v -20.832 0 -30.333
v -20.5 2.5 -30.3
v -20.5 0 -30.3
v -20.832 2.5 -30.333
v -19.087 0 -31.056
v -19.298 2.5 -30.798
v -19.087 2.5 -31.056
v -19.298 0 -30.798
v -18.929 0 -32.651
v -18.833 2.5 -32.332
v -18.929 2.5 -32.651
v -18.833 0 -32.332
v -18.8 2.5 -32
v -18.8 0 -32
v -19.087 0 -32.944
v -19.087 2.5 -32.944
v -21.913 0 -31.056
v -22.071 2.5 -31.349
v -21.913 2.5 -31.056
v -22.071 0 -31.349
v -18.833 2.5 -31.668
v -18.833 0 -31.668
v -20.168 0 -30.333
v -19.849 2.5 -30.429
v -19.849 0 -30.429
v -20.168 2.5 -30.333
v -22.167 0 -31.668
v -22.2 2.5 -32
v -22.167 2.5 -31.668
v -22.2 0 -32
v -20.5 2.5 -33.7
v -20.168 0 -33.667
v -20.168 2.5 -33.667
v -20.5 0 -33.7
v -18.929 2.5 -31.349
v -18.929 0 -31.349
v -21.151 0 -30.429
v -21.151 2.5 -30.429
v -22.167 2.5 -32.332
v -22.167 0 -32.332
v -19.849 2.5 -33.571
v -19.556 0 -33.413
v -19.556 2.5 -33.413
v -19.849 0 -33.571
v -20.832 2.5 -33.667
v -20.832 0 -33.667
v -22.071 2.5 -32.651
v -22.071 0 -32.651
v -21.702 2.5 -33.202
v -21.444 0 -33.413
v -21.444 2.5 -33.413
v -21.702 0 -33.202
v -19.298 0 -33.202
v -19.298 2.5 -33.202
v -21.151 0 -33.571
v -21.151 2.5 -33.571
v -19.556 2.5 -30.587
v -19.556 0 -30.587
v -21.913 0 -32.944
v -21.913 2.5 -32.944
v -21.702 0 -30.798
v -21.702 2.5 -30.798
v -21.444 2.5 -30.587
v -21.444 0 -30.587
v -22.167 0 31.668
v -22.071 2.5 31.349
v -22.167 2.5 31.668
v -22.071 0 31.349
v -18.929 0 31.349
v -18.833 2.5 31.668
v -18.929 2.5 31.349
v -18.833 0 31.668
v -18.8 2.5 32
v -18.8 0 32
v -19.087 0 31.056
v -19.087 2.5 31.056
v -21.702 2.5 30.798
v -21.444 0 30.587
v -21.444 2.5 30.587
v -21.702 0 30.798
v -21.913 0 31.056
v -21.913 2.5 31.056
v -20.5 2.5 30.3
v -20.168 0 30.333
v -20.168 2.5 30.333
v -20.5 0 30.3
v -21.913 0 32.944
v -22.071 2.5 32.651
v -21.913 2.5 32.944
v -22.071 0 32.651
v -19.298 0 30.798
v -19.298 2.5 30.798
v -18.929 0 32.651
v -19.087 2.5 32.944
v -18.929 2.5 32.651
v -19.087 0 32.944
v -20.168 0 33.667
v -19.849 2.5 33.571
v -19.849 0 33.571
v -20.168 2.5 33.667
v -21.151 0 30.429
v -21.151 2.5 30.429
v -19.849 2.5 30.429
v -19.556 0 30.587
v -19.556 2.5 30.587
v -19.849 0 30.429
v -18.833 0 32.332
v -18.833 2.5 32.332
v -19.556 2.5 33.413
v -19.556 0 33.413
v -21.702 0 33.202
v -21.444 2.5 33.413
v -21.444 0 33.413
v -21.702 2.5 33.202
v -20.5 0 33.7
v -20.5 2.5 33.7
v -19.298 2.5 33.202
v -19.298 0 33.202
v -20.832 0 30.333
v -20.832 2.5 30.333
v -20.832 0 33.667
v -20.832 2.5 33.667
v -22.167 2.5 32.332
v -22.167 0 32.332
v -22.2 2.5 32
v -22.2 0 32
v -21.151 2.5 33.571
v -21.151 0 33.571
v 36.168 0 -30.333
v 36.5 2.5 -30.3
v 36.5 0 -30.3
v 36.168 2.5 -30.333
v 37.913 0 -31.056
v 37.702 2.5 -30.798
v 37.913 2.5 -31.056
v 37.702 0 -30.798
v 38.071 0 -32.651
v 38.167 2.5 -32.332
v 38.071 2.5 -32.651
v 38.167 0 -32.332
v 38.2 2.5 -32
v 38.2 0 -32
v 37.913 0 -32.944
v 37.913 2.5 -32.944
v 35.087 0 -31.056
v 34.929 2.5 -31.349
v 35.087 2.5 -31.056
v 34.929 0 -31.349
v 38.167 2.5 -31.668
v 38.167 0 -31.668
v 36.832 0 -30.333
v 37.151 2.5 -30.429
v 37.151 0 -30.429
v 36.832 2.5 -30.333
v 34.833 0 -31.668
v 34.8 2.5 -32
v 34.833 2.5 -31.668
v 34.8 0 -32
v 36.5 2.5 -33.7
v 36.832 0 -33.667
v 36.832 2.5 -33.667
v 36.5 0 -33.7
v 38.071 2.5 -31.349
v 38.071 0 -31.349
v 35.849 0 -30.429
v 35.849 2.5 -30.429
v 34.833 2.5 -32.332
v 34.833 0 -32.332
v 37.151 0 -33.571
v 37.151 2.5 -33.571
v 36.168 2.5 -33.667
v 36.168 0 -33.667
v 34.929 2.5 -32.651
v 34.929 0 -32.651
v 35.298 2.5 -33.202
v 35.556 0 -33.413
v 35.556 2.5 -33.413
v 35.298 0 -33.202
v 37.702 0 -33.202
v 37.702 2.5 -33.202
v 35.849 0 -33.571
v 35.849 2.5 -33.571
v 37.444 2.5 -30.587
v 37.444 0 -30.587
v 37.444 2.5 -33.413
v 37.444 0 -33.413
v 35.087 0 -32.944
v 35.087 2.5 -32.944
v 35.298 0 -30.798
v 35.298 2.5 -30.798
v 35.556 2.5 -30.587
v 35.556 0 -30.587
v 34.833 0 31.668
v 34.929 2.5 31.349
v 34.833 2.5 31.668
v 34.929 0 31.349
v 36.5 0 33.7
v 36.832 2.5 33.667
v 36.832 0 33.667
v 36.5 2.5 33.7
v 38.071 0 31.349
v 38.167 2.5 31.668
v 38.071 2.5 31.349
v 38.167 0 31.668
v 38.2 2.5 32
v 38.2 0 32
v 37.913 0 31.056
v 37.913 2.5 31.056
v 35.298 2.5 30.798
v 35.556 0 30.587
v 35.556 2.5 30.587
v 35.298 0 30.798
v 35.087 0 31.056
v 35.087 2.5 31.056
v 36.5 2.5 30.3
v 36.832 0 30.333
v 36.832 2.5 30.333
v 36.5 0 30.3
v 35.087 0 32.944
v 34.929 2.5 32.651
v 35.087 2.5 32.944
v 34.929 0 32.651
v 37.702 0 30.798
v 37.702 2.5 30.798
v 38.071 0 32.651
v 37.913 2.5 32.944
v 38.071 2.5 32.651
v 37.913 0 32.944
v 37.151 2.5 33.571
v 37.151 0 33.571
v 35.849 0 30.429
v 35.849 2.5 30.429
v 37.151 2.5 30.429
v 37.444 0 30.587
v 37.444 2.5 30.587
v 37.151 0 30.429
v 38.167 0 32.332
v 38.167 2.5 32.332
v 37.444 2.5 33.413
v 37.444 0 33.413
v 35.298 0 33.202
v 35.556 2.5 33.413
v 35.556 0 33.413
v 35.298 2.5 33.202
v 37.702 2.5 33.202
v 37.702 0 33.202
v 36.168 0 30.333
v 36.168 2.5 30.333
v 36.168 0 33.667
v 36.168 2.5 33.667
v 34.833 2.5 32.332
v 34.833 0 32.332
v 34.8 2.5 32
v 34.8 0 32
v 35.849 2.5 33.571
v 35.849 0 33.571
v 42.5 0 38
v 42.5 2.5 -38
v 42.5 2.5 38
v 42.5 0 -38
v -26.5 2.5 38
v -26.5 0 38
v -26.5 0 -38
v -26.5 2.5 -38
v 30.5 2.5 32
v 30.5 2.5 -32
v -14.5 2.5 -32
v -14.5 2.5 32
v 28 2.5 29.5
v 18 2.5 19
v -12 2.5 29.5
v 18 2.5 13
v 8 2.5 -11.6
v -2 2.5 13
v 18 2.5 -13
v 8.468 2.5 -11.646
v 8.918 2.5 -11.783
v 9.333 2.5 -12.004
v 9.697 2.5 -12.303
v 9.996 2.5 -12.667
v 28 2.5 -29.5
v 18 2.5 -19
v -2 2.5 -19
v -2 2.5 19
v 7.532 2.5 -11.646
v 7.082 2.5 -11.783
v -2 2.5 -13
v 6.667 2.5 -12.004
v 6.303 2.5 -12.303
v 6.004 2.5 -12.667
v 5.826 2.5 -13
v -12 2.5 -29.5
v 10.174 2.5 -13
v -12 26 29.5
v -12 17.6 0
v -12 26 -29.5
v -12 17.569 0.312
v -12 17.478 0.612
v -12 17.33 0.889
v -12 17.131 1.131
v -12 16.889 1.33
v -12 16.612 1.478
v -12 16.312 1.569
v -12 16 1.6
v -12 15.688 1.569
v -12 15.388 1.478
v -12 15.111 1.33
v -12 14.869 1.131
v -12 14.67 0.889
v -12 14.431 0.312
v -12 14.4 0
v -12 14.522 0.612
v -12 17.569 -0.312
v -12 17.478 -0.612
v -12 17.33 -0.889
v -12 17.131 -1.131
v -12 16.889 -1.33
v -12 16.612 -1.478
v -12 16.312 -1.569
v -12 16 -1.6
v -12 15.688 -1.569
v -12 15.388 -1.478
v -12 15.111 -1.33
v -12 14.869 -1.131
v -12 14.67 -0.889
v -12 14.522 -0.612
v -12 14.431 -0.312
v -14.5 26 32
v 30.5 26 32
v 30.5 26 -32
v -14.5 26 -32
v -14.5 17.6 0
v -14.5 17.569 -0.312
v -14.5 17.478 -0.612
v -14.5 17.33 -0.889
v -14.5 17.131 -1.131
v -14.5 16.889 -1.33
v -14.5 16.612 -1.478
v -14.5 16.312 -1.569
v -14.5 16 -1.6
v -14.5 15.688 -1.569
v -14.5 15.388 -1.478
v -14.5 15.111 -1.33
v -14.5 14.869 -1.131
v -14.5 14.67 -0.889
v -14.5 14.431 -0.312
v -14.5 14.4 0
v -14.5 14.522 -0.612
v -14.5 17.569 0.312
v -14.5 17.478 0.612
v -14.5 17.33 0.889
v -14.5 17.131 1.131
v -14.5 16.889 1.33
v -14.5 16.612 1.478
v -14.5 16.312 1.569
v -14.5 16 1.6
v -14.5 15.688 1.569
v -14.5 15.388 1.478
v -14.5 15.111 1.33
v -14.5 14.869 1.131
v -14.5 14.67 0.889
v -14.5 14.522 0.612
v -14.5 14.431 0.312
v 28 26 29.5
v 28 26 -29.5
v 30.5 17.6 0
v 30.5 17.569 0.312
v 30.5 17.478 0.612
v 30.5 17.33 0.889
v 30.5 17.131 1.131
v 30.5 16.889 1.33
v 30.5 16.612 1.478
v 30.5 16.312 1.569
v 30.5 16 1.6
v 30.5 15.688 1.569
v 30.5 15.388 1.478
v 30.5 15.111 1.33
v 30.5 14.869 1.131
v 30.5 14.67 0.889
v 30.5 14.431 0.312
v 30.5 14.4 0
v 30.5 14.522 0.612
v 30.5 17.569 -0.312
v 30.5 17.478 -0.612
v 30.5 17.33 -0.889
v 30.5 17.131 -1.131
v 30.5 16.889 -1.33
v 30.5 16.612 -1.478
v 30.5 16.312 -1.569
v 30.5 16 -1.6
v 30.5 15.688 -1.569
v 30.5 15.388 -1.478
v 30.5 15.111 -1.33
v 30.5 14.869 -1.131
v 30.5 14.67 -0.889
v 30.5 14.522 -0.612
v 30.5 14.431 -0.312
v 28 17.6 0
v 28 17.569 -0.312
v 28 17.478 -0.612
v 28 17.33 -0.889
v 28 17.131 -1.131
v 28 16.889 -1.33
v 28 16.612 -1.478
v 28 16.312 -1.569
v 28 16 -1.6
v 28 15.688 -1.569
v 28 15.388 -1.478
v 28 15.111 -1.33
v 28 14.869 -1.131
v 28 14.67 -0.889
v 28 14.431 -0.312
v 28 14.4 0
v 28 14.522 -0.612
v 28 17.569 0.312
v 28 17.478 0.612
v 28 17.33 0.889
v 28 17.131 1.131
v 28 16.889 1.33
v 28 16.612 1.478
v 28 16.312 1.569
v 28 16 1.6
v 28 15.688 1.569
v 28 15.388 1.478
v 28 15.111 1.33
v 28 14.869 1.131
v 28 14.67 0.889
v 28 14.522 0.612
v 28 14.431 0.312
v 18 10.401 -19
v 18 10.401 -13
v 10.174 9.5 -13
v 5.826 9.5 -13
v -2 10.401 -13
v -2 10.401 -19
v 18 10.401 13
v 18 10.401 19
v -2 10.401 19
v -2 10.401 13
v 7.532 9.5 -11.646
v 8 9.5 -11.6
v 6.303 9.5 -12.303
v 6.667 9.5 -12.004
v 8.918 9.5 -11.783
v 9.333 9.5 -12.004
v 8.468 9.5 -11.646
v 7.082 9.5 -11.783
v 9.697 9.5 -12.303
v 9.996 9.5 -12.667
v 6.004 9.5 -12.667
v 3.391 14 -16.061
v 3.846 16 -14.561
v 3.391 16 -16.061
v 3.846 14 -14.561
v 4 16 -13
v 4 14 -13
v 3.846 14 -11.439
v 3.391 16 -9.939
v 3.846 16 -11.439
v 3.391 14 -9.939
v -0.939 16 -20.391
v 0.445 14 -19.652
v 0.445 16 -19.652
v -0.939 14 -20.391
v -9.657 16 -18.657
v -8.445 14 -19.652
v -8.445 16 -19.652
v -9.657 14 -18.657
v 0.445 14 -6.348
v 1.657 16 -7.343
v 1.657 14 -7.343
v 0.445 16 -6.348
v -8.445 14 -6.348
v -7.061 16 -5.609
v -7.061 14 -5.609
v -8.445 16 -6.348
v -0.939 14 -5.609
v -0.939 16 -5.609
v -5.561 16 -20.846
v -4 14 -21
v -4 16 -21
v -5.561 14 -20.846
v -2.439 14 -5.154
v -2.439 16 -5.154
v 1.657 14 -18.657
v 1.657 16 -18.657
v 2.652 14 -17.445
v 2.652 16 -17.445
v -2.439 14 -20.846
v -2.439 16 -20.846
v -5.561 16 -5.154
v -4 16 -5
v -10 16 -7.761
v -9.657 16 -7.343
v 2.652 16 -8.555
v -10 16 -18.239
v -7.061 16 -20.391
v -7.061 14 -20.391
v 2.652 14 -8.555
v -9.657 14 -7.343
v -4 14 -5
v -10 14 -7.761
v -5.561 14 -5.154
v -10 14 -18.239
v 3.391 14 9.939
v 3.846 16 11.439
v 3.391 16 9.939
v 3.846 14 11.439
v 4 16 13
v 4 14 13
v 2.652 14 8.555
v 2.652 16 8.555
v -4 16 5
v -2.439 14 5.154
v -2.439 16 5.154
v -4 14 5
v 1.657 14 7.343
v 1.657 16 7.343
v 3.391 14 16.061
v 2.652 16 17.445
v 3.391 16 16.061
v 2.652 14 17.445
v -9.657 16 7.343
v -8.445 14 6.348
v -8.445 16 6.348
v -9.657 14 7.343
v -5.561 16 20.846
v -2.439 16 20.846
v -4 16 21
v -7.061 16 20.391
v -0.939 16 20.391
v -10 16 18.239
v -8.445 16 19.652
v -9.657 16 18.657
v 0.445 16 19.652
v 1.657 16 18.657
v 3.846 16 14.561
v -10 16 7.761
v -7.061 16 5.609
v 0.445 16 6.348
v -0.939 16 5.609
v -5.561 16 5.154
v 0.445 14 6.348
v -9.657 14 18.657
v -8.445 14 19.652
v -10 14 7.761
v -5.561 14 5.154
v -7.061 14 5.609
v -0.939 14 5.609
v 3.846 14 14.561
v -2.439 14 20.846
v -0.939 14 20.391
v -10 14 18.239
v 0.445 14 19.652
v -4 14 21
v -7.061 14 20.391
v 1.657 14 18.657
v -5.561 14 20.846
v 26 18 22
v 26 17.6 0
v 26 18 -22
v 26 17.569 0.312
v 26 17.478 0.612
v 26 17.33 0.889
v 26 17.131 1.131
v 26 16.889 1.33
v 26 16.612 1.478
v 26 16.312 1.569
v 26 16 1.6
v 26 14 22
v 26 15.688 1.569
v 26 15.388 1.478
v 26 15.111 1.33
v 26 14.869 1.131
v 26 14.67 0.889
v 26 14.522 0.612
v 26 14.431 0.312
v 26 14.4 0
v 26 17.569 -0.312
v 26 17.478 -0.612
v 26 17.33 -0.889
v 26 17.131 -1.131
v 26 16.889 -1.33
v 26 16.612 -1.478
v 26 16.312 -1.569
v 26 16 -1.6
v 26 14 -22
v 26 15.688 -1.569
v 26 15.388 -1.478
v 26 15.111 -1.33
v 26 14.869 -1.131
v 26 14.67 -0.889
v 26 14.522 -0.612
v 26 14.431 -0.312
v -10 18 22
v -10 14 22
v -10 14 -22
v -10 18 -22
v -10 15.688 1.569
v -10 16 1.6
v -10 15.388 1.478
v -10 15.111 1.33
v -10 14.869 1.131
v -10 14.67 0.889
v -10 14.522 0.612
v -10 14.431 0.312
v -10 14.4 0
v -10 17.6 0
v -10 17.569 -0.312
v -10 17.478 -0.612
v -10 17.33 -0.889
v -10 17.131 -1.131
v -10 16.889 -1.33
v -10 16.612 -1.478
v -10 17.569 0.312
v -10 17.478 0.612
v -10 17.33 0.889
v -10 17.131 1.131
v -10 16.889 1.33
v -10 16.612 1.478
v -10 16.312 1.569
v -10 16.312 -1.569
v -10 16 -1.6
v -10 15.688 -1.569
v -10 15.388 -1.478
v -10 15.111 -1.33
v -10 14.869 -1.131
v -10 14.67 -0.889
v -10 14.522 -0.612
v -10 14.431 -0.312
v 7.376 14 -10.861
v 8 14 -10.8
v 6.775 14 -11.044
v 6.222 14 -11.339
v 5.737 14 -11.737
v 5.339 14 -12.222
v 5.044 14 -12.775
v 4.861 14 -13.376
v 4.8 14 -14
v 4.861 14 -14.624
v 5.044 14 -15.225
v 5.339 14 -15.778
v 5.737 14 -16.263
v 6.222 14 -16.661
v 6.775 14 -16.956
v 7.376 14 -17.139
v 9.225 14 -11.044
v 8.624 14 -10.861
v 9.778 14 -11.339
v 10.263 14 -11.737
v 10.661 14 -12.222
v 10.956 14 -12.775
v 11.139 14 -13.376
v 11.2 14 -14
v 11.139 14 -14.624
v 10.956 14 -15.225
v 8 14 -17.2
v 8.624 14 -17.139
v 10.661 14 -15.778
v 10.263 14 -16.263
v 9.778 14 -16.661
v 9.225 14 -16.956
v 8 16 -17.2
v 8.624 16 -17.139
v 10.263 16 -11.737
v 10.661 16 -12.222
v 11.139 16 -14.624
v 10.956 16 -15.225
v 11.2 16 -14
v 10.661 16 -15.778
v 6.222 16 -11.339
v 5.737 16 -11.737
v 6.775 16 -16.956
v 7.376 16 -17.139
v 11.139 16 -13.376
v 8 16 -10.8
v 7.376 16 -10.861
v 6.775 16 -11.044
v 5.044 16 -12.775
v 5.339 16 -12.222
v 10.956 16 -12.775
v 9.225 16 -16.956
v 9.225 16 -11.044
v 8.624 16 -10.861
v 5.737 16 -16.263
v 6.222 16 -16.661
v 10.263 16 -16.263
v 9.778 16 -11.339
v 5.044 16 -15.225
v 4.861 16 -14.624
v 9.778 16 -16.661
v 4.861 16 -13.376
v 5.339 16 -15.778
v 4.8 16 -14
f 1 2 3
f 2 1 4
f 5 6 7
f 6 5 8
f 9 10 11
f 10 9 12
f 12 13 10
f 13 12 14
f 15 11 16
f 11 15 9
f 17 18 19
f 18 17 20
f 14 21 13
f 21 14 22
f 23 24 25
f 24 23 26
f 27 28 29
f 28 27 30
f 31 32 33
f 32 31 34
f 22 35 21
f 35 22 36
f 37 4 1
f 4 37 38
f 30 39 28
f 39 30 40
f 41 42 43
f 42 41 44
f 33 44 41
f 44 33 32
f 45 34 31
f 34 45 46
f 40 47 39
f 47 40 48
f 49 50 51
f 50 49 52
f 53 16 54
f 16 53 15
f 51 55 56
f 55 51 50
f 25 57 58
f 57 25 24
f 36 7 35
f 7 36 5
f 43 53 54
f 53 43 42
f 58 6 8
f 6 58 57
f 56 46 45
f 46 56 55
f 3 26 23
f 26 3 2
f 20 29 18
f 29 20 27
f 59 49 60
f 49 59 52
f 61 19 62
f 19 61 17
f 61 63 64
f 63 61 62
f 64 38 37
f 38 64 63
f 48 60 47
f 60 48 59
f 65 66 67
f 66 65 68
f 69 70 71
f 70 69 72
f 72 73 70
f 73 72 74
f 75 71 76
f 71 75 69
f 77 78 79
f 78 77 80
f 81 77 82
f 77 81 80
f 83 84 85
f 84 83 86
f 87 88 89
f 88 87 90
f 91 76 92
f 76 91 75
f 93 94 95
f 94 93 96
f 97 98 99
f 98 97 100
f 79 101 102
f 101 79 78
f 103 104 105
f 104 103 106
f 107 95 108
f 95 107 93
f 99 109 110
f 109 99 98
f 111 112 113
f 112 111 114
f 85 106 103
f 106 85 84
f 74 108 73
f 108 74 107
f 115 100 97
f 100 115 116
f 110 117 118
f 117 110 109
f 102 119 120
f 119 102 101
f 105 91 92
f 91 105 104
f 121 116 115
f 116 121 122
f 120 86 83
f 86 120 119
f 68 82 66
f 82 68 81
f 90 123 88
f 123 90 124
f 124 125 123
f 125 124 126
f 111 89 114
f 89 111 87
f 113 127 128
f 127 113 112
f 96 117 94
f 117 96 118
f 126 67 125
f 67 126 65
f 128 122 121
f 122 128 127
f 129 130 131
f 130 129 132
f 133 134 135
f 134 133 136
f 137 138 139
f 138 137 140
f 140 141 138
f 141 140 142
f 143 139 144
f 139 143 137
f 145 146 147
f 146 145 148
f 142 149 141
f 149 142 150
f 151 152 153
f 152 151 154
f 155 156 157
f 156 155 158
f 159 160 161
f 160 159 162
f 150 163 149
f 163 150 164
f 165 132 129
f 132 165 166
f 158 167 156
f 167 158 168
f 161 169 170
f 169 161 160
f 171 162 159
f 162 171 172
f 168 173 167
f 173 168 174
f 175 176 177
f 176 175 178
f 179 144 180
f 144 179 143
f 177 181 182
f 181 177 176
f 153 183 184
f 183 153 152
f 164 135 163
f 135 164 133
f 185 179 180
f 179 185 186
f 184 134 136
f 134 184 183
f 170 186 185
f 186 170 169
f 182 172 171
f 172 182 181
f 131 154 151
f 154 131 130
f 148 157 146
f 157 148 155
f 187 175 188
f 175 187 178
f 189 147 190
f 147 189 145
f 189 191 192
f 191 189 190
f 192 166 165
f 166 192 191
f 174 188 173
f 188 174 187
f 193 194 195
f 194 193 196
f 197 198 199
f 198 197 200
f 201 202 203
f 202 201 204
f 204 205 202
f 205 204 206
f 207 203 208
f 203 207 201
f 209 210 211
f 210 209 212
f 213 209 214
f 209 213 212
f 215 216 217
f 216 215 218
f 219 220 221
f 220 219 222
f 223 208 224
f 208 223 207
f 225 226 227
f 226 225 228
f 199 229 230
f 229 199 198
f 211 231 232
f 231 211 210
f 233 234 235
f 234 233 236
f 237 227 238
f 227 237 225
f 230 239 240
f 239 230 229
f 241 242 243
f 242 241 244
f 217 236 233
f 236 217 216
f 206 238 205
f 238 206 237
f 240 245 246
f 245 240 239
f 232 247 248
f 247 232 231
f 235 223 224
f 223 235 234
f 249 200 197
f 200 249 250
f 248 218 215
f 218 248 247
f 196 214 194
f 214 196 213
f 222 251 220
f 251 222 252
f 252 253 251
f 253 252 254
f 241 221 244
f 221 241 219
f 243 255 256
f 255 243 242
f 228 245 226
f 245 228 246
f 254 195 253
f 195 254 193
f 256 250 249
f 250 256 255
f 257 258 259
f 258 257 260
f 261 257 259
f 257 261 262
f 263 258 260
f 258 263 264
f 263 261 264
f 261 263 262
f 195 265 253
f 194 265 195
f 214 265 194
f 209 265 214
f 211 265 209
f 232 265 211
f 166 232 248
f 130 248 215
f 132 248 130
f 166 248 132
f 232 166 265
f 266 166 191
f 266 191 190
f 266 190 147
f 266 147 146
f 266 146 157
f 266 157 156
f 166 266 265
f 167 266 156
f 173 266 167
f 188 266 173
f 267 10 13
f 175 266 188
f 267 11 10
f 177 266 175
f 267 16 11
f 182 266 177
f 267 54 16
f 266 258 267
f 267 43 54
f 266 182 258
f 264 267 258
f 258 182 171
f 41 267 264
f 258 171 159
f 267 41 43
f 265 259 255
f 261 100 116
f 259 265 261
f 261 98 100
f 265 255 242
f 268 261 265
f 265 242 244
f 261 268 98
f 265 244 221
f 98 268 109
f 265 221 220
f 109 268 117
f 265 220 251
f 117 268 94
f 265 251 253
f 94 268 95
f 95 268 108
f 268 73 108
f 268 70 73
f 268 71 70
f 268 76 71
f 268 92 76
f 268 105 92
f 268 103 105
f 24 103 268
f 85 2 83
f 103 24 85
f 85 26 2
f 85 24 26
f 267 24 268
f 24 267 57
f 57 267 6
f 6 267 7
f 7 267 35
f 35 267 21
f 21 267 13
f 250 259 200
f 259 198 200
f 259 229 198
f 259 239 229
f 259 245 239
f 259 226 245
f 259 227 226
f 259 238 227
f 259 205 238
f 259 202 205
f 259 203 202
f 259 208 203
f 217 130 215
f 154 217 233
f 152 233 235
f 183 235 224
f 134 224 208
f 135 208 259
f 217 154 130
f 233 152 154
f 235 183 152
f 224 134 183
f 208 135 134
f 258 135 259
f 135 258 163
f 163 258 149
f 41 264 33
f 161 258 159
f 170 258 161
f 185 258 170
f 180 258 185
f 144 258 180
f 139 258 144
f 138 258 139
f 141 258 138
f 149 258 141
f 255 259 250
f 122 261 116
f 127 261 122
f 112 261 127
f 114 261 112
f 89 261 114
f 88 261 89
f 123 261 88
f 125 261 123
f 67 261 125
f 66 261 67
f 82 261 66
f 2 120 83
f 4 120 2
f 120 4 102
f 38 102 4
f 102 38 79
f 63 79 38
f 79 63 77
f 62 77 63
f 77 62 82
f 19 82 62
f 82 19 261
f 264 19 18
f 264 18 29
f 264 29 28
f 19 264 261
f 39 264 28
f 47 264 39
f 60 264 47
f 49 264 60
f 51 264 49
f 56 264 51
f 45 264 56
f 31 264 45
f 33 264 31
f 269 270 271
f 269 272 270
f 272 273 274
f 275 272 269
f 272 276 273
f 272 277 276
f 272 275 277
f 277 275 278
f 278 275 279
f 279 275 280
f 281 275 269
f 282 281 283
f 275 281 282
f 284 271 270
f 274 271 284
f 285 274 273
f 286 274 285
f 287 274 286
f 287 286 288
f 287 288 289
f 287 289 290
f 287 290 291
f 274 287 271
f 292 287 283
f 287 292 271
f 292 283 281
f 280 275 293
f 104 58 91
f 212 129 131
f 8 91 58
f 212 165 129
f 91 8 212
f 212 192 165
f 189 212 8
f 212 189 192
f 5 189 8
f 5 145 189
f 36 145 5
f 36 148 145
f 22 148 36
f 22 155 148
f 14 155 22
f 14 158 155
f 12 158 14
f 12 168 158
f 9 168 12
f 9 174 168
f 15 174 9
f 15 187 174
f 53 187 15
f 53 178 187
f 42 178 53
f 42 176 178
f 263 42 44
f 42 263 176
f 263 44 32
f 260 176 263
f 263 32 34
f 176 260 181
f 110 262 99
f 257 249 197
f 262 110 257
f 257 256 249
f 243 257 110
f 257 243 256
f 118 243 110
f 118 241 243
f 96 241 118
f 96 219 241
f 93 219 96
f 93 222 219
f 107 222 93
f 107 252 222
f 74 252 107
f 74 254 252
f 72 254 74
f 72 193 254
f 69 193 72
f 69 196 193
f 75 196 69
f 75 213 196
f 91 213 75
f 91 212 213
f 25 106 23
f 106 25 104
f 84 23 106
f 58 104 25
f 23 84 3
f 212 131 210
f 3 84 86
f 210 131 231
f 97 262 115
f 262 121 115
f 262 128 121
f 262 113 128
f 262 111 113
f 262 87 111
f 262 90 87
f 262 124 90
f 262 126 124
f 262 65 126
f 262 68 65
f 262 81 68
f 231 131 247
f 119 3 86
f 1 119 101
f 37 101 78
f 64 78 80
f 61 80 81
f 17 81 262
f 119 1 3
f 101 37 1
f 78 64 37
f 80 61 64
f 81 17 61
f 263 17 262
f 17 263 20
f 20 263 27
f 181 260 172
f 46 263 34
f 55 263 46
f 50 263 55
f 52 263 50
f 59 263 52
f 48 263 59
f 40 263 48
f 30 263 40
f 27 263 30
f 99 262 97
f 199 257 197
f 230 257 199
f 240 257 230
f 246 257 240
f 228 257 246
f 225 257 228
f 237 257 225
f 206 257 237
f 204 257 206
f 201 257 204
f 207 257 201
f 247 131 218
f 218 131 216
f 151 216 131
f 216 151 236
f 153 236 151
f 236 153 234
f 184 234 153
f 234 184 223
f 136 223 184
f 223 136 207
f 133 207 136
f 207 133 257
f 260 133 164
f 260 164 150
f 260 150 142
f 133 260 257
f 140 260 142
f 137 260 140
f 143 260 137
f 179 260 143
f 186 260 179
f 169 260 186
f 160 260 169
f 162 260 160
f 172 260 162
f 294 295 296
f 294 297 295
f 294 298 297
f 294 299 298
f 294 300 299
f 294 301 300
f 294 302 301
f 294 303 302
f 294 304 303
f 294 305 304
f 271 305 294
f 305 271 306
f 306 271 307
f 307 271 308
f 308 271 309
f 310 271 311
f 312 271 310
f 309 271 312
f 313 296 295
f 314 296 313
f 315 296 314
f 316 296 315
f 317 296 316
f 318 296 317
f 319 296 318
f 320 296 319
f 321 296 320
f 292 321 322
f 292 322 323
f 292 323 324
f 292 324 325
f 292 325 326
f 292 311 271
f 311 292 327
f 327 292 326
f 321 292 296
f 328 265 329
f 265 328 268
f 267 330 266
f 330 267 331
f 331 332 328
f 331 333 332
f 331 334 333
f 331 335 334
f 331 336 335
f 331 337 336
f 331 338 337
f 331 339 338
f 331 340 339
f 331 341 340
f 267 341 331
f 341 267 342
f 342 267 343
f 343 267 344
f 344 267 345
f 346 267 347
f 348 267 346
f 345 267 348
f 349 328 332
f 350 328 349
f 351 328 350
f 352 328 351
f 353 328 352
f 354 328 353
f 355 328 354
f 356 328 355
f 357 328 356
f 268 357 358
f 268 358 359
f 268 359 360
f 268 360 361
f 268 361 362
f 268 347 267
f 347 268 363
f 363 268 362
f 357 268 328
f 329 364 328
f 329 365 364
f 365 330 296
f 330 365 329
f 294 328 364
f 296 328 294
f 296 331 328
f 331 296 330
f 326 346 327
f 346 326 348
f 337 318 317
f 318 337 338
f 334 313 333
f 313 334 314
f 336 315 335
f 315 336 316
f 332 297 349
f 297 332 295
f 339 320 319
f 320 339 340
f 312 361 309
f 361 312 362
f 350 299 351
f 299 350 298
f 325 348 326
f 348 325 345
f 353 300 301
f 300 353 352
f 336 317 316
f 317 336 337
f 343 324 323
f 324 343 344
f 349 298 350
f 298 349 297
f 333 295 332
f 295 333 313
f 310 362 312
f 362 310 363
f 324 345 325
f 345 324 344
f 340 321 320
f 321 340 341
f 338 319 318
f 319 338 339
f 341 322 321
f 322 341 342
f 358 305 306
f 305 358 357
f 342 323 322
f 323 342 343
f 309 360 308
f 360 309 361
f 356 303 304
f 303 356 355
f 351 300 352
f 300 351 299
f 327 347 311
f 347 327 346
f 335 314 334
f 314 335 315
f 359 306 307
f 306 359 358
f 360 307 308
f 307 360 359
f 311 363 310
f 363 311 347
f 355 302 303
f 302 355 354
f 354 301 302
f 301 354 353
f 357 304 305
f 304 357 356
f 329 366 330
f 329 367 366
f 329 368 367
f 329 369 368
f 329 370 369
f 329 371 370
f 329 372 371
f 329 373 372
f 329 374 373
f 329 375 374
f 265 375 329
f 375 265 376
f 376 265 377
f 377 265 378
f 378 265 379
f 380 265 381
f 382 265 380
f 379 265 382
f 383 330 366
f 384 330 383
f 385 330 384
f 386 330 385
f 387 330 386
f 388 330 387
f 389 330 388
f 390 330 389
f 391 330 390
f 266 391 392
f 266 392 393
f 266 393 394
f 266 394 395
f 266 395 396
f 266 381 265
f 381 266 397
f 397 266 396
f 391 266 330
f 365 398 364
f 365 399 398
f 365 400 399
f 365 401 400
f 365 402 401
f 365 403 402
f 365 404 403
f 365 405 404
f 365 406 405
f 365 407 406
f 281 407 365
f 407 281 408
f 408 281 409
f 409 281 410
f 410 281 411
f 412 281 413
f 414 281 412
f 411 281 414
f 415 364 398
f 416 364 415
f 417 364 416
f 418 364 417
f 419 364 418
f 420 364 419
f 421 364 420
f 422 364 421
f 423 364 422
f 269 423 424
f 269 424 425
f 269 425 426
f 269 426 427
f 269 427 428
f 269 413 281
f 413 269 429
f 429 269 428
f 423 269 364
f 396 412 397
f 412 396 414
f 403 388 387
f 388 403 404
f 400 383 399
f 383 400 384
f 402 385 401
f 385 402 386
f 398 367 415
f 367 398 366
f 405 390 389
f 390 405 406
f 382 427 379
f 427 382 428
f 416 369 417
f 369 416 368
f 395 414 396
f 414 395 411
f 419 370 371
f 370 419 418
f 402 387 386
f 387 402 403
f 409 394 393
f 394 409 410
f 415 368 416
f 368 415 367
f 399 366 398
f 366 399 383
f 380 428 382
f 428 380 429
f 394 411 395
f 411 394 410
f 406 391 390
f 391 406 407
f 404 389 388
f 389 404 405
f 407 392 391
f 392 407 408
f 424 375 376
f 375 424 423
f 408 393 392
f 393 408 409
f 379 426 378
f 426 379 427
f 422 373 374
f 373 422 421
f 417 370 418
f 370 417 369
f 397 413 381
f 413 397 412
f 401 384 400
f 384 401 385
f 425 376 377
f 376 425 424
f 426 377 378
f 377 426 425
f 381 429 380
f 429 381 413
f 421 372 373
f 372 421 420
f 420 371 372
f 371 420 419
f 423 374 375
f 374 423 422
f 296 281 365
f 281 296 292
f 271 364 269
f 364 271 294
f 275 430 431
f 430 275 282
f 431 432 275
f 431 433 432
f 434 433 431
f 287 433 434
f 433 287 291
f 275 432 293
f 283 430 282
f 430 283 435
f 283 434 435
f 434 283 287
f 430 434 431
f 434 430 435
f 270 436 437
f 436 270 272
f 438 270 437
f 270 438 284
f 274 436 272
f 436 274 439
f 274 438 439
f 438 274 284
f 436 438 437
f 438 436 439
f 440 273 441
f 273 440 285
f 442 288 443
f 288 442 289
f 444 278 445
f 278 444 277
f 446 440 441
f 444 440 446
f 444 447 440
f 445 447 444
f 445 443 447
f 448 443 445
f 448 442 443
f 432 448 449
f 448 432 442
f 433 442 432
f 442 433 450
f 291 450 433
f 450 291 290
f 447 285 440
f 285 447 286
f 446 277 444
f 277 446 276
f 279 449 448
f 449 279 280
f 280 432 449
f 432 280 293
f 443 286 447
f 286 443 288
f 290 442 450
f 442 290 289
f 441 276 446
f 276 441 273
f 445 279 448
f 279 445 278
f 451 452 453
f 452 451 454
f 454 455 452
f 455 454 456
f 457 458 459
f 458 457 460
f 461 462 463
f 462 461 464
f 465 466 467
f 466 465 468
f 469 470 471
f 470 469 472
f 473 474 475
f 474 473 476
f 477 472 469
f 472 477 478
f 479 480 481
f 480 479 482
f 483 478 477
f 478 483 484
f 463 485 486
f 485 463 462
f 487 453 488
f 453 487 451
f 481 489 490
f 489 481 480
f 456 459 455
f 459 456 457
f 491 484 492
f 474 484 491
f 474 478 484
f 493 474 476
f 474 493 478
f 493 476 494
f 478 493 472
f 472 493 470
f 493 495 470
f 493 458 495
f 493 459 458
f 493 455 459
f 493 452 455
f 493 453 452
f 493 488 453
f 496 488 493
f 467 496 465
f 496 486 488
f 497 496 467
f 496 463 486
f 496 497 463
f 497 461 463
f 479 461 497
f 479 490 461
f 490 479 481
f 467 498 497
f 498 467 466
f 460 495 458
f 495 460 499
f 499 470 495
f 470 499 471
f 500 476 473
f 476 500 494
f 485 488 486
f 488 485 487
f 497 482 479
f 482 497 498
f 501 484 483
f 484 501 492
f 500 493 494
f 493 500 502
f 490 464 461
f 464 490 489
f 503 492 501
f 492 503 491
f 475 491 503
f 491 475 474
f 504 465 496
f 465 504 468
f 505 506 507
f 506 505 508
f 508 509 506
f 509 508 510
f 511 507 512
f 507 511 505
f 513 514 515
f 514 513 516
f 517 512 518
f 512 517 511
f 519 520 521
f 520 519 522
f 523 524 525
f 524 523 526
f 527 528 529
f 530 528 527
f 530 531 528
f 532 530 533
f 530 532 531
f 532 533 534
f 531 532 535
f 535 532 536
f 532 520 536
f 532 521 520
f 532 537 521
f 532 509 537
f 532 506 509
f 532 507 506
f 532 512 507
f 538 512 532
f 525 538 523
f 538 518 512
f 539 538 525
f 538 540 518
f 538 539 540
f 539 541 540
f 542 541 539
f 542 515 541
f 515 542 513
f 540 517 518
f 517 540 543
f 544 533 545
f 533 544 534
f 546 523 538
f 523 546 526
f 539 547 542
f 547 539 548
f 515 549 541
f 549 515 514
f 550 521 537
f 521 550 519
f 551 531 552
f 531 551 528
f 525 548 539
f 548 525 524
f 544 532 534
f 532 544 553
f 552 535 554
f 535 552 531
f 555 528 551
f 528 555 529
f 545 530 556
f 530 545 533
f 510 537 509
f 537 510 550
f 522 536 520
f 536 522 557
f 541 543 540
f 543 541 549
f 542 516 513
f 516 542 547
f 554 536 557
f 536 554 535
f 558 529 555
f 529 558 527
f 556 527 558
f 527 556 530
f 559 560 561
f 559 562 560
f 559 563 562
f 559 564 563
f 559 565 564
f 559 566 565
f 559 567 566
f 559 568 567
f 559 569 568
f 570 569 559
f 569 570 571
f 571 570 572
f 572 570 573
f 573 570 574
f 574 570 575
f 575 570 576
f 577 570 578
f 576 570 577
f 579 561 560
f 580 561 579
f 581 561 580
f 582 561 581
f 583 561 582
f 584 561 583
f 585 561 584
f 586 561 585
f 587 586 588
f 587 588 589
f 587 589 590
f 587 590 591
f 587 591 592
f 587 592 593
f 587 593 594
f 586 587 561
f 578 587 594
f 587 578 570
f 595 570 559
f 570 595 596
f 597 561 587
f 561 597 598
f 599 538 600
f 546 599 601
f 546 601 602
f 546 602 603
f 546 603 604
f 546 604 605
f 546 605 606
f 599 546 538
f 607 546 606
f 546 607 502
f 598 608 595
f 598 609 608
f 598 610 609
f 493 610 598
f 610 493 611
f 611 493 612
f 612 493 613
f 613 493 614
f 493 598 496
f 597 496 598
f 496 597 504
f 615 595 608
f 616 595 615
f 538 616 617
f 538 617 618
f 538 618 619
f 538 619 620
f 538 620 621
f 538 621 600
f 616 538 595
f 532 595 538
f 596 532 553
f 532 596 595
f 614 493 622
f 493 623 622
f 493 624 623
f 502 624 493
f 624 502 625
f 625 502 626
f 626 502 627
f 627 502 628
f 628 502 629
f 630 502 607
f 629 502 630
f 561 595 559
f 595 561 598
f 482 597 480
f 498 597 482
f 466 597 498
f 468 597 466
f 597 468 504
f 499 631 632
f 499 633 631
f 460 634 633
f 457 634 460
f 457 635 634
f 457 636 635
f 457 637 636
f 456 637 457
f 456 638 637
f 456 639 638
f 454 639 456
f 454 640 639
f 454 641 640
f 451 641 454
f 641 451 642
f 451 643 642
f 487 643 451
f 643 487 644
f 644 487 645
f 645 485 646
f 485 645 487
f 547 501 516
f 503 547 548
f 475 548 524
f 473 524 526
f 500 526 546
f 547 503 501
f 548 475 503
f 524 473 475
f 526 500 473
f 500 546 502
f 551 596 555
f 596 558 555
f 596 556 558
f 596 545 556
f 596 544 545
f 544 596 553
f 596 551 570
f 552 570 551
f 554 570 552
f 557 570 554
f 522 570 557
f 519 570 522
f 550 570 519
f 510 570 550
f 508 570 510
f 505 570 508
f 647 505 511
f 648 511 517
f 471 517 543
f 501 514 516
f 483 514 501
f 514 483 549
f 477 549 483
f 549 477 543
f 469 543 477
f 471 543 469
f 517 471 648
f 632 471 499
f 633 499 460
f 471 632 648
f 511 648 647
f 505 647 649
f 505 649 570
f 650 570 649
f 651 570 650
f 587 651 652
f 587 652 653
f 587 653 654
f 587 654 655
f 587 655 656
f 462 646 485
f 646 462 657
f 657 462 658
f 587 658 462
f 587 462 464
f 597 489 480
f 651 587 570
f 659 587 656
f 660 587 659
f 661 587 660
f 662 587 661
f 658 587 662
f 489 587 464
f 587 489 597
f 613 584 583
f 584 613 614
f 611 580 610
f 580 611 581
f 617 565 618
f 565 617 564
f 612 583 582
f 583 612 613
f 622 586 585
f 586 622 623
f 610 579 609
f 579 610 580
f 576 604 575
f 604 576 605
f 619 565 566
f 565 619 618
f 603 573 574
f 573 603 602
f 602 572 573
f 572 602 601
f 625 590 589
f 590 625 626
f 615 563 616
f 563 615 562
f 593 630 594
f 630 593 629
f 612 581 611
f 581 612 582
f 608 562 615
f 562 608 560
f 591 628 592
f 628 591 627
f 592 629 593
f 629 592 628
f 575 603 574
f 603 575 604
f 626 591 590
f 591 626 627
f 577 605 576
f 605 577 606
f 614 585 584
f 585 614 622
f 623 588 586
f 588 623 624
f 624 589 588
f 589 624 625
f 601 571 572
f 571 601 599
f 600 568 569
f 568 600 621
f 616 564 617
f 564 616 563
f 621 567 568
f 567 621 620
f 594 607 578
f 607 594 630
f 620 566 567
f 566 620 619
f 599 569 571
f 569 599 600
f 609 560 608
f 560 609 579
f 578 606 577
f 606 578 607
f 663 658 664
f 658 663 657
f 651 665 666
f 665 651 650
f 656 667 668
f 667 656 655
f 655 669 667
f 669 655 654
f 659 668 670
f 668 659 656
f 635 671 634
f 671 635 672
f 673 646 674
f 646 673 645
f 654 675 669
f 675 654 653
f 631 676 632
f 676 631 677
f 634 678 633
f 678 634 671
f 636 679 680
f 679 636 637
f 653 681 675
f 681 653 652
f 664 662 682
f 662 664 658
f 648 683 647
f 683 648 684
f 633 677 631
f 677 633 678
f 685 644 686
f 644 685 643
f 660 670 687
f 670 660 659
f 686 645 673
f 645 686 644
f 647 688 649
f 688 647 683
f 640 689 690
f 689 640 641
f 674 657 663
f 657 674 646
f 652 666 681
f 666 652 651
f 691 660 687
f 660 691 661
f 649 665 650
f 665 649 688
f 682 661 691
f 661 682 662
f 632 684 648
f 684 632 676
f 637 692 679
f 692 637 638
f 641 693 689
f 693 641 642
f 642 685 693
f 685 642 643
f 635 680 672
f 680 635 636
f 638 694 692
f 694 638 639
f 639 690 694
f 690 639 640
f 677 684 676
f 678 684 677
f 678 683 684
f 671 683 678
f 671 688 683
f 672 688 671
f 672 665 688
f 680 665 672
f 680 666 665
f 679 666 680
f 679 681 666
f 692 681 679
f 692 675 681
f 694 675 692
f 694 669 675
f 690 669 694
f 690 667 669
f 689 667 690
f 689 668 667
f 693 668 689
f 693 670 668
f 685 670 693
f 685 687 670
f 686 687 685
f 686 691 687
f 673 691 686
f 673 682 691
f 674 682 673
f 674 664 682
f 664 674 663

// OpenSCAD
// dummy_rocker.scad - dummy rocker for the light-switch bench rig
// (Issue #13; rig for Issue #7).
//
// A spring-loaded seesaw paddle in a shallow box that stands in for a
// wall switch rocker, so push force and stroke can be measured on the
// bench (unit U6) without the real switch. Mounts on the same vertical
// bench board as bracket.scad, at the rocker position.
//
// Coordinates match bracket.scad: origin at the rocker centre on the
// wall plane. X: right (wall-parallel), Y: out from the wall, Z: up.
// Units: mm.
//
// The paddle pivots on an M3 screw (axis along X). A short compression
// spring (pen-spring class) behind the lower half returns the paddle
// to its rest tilt. Internal stops limit the tilt to +/- max_tilt,
// giving about 3.8 mm of travel at the paddle ends - representative of
// a real rocker; tune stop_y / max_tilt if a target switch differs.
//
// Render status: verified with OpenSCAD 2021.01 (Issue #13) - box,
// paddle and assembled views render as single valid solids.

// ---- Parameters ----
part = "assembled";    // "box", "paddle" or "assembled"

paddle_x = 8;          // paddle centre offset in X (under the arm)
paddle_w = 36;         // paddle width  (X)
paddle_h = 44;         // paddle height (Z)
paddle_t = 4;          // paddle thickness (Y)
box_depth = 26;        // box front rim distance from the wall (Y)
box_wall = 2.5;        // box wall thickness
pivot_y = 16;          // pivot axis distance from the wall (Y)
max_tilt = 10;         // paddle tilt limit, degrees
spring_z = -14;        // return-spring centre height (below pivot)

$fn = 32;

// ---- Derived ----
box_w = paddle_w + 4 + 2 * box_wall;         // inner clearance 2/side
box_h = paddle_h + 20;
flange_w = box_w + 24;
flange_h = box_h + 12;
stop_y = pivot_y - paddle_t / 2
         - (paddle_h / 2 - 3) * sin(max_tilt) - 0.3;

module box() {
  union() {
    // Back flange: screws to the bench board at the rocker position.
    difference() {
      translate([paddle_x - flange_w / 2, 0, -flange_h / 2])
        cube([flange_w, box_wall, flange_h]);
      for (sx = [-1, 1], sz = [-1, 1])
        translate([paddle_x + sx * (flange_w / 2 - 6), -1,
                   sz * (flange_h / 2 - 6)])
          rotate([-90, 0, 0]) cylinder(h = box_wall + 2, r = 1.7);
    }
    // Side walls (pivot cheeks), embedded 1 mm into the flange.
    for (sx = [-1, 1]) {
      wx = paddle_x + sx * (paddle_w / 2 + 2) - (sx < 0 ? box_wall : 0);
      difference() {
        translate([wx, box_wall - 1, -box_h / 2])
          cube([box_wall, box_depth - box_wall + 1, box_h]);
        // Pivot pin hole (M3 screw).
        translate([wx - 1, pivot_y, 0])
          rotate([0, 90, 0]) cylinder(h = box_wall + 2, r = 1.6);
      }
    }
    // Top and bottom walls, embedded into flange and side walls.
    for (sz = [-1, 1])
      translate([paddle_x - box_w / 2, box_wall - 1,
                 sz * box_h / 2 - (sz > 0 ? box_wall : 0)])
        cube([box_w, box_depth - box_wall + 1, box_wall]);
    // Tilt stops inside, top and bottom (behind the paddle).
    for (sz = [-1, 1])
      translate([paddle_x - 10, box_wall - 1,
                 sz * (paddle_h / 2 - 3) - (sz > 0 ? 6 : 0)])
        cube([20, stop_y - box_wall + 1, 6]);
    // Return-spring guide post on the back, below the pivot.
    translate([paddle_x, box_wall, spring_z])
      rotate([-90, 0, 0]) cylinder(h = 7, r = 2.4);
  }
}

module paddle() {
  // Modelled centred on the pivot; place with translate/rotate.
  difference() {
    translate([-paddle_w / 2, -paddle_t / 2, -paddle_h / 2])
      cube([paddle_w, paddle_t, paddle_h]);
    // Pivot pin hole (M3 screw).
    translate([-paddle_w / 2 - 1, 0, 0])
      rotate([0, 90, 0]) cylinder(h = paddle_w + 2, r = 1.6);
    // Spring pocket on the back of the lower half.
    translate([0, -paddle_t / 2 - 1, spring_z])
      rotate([-90, 0, 0]) cylinder(h = 3, r = 3.2);
    // Lightening pockets on the back, top and bottom.
    for (sz = [-1, 1])
      translate([-paddle_w / 2 + 6, -paddle_t / 2 - 1, sz * 13])
        rotate([-90, 0, 0]) cylinder(h = 3, r = 8);
  }
}

if (part == "box") box();
else if (part == "paddle") paddle();
else {
  box();
  translate([paddle_x, pivot_y, 0]) paddle();
}
